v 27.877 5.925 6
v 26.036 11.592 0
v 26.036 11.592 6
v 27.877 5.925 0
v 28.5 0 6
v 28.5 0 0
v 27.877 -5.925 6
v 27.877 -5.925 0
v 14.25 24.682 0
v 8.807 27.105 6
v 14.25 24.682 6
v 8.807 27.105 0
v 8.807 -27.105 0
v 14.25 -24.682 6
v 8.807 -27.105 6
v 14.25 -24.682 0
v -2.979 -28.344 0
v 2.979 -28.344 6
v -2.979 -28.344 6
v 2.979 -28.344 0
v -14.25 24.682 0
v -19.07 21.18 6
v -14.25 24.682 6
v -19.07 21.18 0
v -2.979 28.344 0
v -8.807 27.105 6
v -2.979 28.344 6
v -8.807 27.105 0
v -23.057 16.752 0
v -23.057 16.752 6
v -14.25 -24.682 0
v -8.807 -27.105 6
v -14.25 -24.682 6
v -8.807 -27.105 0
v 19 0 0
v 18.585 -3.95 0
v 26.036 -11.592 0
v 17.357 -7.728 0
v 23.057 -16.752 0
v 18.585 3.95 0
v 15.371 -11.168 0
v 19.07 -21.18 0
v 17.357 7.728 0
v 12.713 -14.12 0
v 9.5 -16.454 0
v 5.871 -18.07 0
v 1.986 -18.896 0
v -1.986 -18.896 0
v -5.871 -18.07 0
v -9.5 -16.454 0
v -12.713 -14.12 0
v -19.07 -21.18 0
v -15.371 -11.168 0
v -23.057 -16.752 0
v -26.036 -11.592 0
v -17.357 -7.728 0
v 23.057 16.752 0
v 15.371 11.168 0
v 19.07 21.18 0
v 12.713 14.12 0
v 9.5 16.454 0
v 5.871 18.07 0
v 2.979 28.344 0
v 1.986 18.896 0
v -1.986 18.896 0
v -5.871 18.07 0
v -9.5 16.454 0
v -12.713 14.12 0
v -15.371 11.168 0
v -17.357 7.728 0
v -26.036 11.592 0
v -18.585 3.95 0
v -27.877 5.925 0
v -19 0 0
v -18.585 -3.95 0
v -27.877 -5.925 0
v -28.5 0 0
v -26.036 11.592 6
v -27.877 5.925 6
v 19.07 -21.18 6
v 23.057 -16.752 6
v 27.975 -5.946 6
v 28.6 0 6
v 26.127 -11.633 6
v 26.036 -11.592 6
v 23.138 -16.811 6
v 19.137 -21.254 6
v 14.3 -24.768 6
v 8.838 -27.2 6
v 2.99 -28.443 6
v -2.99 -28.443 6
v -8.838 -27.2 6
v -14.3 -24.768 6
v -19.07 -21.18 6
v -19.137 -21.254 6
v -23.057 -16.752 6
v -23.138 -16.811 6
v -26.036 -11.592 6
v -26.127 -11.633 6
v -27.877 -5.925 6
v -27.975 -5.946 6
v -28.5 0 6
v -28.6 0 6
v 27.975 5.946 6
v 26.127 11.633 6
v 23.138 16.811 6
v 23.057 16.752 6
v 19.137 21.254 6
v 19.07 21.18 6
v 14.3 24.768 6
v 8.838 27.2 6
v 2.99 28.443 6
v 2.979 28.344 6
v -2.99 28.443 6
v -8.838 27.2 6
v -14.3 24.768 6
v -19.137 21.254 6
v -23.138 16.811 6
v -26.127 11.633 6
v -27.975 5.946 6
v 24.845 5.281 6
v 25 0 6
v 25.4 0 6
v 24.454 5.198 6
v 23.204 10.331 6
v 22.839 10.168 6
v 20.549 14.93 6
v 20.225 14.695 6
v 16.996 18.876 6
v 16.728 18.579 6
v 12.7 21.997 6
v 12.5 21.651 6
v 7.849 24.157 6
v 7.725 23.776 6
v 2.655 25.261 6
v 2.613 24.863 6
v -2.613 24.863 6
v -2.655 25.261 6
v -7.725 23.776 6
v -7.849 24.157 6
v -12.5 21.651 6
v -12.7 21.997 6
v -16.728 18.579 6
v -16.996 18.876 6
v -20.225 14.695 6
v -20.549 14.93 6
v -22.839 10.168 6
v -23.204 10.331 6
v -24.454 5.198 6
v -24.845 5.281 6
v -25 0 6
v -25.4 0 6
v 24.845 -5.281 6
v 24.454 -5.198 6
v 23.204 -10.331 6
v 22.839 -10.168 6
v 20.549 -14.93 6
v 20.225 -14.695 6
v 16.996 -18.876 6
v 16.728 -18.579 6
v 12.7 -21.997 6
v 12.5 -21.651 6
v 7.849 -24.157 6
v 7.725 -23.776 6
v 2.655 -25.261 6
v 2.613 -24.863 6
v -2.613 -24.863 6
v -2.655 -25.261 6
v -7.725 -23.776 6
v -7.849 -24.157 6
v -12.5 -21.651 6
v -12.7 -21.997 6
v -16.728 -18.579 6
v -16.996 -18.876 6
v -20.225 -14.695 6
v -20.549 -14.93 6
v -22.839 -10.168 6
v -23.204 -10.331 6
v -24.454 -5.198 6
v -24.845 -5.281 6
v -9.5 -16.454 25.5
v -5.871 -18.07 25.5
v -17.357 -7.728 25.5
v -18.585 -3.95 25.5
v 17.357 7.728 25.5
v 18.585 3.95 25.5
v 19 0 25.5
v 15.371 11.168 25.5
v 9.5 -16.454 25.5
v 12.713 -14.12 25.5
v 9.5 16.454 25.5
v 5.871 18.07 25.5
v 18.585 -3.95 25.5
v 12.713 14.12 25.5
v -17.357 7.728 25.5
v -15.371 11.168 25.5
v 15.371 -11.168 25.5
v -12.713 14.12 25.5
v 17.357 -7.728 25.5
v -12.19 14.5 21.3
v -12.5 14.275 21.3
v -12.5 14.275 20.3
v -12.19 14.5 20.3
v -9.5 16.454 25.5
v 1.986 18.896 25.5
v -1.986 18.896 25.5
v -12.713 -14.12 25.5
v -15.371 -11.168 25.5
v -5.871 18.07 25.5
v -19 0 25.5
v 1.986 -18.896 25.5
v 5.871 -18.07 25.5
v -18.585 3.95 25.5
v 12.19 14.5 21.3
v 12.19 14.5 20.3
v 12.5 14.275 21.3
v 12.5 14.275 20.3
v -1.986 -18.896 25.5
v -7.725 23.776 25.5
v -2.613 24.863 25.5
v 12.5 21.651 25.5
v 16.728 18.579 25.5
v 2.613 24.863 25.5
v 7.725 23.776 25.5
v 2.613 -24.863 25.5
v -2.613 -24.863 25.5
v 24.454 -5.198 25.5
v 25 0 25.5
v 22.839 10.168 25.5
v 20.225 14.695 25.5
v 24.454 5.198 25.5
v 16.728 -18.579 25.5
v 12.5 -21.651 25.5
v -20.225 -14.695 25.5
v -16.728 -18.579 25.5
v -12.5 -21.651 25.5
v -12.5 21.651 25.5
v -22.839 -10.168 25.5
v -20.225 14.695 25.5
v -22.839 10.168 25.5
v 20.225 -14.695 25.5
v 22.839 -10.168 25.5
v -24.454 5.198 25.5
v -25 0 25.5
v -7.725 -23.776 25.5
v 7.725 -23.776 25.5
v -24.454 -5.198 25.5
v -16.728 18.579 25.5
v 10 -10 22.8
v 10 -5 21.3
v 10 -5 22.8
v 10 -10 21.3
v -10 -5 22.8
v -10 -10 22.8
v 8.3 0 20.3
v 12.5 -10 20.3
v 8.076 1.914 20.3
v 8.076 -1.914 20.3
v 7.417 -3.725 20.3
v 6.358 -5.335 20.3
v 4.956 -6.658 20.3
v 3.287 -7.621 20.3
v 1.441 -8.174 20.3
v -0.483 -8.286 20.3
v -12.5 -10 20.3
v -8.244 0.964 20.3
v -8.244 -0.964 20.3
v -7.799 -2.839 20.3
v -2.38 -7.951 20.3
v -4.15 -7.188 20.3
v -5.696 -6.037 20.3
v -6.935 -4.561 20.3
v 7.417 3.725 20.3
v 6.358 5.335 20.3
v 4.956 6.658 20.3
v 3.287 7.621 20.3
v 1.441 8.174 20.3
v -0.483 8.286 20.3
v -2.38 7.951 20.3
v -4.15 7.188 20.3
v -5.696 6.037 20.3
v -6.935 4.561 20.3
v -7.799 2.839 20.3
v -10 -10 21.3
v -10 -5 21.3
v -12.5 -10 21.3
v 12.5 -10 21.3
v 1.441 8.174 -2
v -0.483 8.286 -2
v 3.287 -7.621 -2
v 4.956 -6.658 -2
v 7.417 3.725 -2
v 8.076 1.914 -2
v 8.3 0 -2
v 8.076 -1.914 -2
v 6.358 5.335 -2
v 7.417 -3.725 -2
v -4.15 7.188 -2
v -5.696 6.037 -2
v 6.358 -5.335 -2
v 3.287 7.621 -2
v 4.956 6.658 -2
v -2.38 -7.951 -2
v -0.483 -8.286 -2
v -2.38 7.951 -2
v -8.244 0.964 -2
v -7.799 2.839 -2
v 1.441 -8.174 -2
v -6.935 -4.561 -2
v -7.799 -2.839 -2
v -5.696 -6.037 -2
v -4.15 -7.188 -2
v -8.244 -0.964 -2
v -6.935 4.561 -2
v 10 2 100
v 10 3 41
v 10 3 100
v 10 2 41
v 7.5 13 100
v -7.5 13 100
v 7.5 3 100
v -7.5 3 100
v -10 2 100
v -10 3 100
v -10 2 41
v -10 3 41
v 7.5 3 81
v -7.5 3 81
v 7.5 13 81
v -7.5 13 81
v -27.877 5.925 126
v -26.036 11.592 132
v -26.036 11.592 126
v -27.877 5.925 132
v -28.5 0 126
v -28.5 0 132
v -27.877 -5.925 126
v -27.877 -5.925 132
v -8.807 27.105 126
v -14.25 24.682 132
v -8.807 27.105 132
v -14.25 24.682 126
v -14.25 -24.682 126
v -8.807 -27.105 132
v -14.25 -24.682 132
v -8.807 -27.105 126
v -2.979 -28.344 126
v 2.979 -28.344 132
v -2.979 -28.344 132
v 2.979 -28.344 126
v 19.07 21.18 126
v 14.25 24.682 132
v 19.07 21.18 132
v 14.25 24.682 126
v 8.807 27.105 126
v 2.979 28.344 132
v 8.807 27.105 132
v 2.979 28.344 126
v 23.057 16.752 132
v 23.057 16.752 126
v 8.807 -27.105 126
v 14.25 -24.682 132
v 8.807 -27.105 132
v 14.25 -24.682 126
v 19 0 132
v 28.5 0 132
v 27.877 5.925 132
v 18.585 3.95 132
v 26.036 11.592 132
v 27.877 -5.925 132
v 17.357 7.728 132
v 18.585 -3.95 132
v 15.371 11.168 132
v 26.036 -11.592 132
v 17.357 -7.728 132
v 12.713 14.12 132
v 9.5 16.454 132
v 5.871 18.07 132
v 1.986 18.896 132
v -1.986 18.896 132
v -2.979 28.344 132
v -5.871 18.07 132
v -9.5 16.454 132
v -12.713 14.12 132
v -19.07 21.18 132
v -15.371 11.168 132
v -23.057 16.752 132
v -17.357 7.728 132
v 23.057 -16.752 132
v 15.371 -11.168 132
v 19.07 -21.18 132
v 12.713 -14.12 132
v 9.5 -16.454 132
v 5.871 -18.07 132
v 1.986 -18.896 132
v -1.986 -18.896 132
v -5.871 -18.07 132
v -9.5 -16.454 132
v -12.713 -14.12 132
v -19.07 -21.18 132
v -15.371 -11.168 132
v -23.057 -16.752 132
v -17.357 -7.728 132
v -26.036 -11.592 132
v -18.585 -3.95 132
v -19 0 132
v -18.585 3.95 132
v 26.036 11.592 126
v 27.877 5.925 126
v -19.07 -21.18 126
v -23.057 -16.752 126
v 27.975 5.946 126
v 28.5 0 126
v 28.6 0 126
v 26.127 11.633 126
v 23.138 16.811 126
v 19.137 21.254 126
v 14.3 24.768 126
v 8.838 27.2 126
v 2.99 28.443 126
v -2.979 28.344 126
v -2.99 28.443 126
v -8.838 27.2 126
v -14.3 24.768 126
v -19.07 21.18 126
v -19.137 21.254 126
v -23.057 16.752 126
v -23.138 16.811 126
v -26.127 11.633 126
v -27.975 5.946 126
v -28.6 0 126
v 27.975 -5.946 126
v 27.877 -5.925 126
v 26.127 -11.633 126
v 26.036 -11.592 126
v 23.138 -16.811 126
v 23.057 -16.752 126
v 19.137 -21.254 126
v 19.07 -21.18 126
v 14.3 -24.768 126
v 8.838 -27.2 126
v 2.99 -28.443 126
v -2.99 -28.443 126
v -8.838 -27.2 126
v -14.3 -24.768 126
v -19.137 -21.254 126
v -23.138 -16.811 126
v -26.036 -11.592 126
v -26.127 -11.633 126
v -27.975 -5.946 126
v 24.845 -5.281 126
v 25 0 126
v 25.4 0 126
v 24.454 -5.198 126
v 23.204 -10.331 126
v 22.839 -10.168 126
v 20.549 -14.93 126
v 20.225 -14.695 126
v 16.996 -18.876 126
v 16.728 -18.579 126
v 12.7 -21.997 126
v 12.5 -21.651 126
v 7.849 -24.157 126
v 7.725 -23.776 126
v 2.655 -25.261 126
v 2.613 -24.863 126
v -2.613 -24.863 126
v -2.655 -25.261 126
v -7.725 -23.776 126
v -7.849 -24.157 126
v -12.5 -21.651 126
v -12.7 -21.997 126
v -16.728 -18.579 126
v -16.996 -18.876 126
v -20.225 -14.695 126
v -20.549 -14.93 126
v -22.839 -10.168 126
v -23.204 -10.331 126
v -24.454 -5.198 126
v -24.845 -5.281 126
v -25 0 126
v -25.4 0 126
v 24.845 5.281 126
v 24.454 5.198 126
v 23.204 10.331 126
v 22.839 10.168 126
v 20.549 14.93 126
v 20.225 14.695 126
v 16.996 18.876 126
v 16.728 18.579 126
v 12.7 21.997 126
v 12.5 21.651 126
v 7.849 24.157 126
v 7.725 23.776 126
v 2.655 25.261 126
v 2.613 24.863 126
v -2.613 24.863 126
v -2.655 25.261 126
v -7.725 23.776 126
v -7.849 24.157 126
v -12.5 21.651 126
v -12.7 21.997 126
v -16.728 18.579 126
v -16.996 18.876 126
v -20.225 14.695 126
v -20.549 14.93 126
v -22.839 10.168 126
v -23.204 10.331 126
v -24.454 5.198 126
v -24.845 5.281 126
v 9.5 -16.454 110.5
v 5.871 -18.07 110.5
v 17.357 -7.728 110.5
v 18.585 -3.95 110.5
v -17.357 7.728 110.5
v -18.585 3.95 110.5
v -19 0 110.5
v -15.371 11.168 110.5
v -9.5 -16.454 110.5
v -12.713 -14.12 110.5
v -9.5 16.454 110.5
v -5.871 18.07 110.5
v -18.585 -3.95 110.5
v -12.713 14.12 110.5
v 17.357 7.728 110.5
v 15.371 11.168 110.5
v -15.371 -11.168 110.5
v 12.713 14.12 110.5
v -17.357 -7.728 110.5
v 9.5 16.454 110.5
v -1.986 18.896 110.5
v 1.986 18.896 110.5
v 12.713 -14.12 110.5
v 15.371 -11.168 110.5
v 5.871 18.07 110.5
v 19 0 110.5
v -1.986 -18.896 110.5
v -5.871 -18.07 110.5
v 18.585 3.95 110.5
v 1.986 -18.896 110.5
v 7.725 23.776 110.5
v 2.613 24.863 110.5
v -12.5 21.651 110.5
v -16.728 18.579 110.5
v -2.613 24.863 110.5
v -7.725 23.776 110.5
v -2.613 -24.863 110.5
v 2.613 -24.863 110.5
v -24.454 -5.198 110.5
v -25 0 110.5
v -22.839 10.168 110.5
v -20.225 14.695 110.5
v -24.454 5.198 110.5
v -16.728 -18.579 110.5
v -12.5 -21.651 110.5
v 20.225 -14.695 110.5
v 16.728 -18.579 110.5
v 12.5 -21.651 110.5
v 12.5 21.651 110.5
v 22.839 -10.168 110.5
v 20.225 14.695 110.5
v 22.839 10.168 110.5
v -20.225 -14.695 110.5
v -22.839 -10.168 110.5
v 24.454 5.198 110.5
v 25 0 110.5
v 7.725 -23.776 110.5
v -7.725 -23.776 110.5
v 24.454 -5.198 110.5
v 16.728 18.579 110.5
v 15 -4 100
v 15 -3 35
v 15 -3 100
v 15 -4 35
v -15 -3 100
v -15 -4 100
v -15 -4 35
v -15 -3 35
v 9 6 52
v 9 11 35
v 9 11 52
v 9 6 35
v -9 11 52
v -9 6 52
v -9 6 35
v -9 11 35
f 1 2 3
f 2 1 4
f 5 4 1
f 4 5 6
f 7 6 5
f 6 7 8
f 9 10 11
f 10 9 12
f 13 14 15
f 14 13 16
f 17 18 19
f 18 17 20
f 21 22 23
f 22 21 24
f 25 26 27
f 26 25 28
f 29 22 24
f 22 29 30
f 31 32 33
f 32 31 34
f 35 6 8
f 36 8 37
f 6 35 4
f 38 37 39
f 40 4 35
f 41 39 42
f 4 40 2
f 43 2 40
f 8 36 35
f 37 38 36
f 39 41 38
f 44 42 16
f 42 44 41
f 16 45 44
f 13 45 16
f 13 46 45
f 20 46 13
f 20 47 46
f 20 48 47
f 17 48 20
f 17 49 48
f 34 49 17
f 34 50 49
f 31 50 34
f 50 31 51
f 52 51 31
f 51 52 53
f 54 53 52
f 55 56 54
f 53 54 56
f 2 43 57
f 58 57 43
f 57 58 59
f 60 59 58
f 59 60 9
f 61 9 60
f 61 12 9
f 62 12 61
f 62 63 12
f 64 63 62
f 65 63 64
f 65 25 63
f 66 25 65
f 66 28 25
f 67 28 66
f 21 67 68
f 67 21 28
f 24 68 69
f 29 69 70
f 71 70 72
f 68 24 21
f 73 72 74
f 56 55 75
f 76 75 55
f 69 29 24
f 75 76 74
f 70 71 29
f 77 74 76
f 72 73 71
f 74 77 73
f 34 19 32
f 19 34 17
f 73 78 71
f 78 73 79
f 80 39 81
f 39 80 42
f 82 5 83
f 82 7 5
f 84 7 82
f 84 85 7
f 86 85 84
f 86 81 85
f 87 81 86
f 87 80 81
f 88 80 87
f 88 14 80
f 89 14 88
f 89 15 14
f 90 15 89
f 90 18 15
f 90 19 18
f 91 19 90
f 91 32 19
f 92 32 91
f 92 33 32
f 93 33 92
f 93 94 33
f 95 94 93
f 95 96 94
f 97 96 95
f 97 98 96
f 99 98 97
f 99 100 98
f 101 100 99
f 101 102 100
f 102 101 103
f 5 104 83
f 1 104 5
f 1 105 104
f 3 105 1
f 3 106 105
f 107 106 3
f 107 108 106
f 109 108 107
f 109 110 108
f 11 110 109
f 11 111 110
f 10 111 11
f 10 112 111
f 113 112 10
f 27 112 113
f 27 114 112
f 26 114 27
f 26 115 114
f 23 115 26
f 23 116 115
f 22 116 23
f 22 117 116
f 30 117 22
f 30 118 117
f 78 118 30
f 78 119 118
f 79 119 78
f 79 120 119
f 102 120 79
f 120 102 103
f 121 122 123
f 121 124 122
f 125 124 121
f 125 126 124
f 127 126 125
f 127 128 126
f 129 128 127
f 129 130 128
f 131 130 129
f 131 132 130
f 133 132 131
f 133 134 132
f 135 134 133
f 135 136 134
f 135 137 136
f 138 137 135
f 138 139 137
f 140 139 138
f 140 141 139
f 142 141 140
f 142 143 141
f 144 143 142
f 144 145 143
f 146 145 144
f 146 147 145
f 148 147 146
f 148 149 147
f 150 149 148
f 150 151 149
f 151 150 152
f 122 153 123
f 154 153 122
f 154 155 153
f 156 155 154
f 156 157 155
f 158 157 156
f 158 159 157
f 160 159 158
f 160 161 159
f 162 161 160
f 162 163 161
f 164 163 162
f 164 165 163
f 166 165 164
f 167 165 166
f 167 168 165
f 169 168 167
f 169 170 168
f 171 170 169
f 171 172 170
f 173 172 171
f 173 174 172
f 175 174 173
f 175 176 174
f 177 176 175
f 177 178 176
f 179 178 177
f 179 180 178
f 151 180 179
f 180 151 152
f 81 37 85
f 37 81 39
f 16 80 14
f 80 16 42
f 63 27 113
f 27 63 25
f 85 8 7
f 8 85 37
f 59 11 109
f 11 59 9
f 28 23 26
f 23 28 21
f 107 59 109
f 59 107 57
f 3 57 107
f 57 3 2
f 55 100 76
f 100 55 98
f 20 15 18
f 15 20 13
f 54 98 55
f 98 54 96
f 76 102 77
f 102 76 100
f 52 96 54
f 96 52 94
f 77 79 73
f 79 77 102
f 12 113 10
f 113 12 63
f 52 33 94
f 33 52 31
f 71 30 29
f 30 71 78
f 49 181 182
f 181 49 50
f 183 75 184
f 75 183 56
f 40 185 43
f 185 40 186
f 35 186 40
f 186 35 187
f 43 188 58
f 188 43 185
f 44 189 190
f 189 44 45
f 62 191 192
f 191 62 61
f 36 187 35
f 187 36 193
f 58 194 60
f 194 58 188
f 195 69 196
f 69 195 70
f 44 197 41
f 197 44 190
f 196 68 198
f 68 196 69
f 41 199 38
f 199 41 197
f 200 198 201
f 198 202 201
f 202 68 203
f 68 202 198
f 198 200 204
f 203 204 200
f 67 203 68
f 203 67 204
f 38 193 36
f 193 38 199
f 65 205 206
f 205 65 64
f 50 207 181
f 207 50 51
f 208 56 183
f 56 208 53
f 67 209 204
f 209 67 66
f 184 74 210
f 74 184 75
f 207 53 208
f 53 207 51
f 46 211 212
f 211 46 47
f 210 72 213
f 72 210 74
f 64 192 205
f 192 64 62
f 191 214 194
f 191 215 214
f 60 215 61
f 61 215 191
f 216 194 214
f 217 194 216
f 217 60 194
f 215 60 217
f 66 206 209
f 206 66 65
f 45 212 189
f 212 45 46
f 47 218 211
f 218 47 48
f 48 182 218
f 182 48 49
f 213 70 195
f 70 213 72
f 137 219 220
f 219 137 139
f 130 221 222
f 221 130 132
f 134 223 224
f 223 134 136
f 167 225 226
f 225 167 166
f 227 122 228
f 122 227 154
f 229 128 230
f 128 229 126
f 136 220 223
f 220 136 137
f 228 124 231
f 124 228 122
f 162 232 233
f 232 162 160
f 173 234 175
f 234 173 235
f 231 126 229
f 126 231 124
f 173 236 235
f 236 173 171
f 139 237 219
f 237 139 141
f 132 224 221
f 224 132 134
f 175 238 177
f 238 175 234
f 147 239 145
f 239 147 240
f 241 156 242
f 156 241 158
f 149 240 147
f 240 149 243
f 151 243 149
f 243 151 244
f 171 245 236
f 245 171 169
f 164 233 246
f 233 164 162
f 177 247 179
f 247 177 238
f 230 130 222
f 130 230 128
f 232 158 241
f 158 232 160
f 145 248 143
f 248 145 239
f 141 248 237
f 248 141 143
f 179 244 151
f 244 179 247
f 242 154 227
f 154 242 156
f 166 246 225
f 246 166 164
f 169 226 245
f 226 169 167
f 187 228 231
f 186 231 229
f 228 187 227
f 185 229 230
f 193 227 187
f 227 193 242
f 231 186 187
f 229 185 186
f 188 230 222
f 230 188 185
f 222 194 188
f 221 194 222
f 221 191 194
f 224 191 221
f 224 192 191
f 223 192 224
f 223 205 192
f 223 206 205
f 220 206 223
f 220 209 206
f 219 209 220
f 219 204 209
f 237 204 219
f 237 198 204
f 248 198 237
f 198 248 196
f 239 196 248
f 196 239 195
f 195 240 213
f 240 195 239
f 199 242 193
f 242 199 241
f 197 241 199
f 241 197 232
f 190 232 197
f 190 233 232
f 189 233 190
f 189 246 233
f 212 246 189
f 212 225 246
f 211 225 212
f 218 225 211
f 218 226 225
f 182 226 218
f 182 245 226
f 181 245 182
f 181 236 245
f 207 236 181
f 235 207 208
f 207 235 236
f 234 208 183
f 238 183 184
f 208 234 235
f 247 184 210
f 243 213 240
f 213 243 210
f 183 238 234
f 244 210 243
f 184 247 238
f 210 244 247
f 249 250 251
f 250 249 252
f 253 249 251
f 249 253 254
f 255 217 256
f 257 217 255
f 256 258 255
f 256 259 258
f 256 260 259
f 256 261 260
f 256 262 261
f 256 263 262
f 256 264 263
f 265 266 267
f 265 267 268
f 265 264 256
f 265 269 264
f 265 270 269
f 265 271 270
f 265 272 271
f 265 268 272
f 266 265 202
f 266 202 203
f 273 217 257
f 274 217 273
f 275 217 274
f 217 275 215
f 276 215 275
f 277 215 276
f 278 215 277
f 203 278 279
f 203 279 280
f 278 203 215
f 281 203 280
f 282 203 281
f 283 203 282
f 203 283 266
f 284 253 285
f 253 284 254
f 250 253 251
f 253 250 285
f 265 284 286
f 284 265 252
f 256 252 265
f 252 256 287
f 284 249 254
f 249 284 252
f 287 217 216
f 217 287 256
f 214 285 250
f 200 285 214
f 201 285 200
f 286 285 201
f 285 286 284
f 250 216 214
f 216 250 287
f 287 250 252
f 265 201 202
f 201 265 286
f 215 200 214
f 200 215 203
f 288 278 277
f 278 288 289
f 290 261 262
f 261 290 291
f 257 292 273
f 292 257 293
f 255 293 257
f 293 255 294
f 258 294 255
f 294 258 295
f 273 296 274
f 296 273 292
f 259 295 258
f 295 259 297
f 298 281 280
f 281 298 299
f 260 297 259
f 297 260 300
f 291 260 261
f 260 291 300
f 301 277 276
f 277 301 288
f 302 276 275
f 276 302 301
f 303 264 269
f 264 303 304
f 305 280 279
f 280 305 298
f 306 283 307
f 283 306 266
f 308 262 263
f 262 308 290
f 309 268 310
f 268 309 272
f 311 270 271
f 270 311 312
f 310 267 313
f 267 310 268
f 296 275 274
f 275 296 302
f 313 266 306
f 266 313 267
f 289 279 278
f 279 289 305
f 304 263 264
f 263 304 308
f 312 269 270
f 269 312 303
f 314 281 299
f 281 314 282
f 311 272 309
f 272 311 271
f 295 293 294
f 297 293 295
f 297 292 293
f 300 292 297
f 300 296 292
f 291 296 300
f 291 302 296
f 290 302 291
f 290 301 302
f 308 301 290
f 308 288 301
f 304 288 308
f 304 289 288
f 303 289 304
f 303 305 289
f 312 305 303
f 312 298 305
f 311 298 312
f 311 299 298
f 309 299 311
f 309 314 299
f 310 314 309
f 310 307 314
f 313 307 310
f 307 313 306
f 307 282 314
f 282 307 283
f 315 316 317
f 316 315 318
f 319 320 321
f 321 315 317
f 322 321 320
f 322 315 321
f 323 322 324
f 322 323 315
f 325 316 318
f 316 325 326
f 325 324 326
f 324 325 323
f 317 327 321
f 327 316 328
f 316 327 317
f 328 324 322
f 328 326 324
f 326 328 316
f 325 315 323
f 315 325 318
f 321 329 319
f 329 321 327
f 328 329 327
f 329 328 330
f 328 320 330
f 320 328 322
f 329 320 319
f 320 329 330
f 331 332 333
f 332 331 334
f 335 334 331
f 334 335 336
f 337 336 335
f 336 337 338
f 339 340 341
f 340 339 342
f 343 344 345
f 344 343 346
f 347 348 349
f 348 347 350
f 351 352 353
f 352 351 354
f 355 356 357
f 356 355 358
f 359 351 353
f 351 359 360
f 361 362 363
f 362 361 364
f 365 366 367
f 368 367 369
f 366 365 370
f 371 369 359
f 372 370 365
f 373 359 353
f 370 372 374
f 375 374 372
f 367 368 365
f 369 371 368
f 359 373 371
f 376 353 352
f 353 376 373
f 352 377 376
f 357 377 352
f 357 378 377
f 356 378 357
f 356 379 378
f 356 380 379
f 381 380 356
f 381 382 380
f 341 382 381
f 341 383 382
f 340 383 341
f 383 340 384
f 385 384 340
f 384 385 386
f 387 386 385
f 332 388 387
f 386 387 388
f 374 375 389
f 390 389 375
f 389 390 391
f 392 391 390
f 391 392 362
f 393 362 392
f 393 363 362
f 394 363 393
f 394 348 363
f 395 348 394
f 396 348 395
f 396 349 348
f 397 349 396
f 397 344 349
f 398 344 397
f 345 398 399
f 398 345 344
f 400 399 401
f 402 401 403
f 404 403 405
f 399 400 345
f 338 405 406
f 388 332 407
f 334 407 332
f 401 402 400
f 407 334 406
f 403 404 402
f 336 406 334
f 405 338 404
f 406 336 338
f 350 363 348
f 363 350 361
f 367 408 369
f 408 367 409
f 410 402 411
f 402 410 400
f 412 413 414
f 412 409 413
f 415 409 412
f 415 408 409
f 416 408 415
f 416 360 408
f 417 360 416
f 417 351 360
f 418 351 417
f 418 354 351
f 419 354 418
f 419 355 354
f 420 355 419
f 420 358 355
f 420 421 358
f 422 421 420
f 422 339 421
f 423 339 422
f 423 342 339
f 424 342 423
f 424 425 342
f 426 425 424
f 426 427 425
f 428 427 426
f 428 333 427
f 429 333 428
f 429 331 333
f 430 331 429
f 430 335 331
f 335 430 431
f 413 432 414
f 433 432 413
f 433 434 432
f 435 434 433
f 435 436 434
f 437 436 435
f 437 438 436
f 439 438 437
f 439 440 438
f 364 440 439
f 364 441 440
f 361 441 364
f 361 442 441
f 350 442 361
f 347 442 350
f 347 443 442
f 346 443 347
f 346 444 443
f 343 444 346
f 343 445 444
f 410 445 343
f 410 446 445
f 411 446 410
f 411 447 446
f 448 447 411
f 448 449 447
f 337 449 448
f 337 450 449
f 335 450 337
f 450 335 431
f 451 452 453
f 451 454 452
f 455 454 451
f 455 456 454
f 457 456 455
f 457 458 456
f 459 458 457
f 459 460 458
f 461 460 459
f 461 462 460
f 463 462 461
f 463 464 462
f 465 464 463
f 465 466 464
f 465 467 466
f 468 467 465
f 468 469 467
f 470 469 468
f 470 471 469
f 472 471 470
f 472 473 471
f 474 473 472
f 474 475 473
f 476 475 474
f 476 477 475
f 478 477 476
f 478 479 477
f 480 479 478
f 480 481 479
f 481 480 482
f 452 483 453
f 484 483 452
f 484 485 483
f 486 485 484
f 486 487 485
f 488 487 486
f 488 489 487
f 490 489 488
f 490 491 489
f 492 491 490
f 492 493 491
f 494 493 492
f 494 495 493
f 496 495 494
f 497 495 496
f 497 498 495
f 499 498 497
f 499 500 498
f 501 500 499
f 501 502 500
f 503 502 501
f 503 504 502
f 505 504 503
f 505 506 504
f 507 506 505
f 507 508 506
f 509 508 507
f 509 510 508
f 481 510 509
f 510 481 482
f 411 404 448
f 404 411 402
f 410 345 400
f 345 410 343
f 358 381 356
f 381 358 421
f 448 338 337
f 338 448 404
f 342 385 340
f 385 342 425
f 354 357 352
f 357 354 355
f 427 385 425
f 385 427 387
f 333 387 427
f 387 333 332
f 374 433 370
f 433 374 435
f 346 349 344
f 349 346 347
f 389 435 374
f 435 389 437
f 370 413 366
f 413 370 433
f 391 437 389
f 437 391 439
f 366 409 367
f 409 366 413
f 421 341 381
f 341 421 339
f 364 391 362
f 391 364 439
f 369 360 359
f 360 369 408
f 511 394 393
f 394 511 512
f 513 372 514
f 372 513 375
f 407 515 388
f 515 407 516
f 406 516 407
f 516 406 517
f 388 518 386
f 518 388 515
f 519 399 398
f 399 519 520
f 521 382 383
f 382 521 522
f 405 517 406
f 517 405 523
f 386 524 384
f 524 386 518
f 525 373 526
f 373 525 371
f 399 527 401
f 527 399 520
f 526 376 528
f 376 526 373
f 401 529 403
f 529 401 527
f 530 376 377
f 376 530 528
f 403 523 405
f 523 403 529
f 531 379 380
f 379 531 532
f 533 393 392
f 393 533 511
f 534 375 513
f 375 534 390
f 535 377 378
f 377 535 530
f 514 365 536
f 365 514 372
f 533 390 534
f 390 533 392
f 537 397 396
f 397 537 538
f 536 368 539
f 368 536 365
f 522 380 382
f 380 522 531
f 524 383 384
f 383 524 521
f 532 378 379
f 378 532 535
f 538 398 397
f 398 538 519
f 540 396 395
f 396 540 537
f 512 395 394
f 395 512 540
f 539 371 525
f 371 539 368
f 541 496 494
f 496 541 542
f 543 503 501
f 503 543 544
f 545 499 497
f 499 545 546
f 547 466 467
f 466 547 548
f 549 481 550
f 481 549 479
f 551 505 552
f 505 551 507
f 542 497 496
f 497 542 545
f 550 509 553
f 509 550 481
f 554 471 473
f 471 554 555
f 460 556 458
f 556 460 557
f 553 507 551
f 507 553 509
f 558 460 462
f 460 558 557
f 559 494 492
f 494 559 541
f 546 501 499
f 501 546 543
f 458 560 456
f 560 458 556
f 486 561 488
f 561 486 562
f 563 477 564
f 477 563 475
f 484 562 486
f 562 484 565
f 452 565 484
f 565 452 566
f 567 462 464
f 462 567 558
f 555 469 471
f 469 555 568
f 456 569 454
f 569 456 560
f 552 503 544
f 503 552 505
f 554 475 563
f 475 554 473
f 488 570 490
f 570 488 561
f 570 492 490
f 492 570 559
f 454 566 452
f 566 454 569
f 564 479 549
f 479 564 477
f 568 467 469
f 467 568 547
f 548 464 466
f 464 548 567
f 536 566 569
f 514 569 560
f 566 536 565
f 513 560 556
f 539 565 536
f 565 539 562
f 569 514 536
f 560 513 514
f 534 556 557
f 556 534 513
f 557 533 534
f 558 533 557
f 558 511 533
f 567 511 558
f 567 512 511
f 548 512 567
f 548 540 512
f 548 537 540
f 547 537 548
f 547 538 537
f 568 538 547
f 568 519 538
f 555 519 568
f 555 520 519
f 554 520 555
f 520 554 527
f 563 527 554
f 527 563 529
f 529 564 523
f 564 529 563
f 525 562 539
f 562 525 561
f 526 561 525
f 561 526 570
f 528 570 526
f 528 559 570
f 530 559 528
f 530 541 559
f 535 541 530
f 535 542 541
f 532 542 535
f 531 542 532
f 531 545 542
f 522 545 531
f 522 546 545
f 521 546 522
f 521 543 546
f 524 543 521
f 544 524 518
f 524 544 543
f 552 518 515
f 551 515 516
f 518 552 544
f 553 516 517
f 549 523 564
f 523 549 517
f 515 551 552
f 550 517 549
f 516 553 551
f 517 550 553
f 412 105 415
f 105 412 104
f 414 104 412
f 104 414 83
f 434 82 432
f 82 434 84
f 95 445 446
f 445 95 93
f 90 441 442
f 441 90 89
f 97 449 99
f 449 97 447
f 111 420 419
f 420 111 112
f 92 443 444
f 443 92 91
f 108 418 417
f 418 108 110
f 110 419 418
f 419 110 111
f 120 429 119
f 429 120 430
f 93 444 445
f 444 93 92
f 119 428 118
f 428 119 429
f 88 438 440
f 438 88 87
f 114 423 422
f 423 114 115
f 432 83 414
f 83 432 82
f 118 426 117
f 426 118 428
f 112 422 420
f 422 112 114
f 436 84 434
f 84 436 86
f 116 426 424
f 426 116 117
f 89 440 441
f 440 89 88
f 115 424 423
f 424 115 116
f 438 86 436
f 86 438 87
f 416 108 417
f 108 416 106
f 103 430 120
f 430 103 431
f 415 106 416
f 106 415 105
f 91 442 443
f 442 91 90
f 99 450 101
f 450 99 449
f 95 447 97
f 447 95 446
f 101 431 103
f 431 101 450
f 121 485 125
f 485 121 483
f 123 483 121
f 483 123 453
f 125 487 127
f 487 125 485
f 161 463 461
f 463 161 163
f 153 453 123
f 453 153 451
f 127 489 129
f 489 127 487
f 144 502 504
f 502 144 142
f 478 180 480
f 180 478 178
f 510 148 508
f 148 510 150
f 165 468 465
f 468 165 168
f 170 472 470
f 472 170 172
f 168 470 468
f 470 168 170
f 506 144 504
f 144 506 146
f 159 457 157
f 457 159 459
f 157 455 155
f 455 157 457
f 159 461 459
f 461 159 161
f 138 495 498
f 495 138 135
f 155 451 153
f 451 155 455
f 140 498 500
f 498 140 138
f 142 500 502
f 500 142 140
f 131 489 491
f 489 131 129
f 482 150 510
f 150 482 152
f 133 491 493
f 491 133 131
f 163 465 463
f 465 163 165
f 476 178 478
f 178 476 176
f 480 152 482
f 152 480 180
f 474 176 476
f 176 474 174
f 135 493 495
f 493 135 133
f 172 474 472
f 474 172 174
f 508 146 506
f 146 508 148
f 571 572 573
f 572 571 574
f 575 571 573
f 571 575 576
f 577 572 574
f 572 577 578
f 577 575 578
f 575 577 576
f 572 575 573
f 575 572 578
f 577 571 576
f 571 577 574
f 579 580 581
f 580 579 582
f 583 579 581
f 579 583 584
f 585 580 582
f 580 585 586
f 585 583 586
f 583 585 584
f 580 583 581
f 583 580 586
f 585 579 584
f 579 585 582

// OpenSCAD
// in mm

// Tube module -- radius is outer radius
module tube(height, radius, wall) {
  difference() {
    cylinder(h=height, r=radius);
    translate([0, 0, -1]) cylinder(h=height+2, r=radius-wall);
  }
}

// Flange module
module flange() {
  color("gray") tube(6, 57/2, 7/2+12/2);
  translate([0, 0, 6]) color("gray") tube(21.5-6, 50/2, 12/2);
}

// --- main unit --

// Top flange
flange();

// Flange connector
translate([0, 0, 31/2+6]) color("blue") tube(4, 50/2, 12/2);
// TODO add screw holes

// Camera
translate([0, 0, -2]) union() {
  translate([-25/2+2.5, -10, 22.3]) cube([20, 5, 2.5]);
  translate([-25/2, -10, 22.3]) cube([25, 24.5, 1]);
  cylinder(h=22.3, r=8.3);
}

// Camera sled
//translate([2.5, 0, 59-19]) cube([25, 24.5, 2]);

// Electronics sled
//translate([2.5, 0, 59-19]) cube([15, 11, 19]);

// Pi Zero
translate([-15, -4, 35]) cube([30, 1, 65]);

// Ethernet
translate([-10, 2, 35+65-59]) union() {
  cube([20, 1, 59]);
  translate([2.5, 0, 59-19]) cube([15, 11, 19]);
}

// Power supply
translate([-9, 6, 35]) cube([18, 5, 17]);

// -- tube and bottom flange, attached later --

// Bottom flange
translate([0, 0, 132]) rotate([0, 180, 0]) flange();

// Tube
color("white", 0.1) translate([0, 0, 6]) tube(120, 57.2/2, 3.2);
